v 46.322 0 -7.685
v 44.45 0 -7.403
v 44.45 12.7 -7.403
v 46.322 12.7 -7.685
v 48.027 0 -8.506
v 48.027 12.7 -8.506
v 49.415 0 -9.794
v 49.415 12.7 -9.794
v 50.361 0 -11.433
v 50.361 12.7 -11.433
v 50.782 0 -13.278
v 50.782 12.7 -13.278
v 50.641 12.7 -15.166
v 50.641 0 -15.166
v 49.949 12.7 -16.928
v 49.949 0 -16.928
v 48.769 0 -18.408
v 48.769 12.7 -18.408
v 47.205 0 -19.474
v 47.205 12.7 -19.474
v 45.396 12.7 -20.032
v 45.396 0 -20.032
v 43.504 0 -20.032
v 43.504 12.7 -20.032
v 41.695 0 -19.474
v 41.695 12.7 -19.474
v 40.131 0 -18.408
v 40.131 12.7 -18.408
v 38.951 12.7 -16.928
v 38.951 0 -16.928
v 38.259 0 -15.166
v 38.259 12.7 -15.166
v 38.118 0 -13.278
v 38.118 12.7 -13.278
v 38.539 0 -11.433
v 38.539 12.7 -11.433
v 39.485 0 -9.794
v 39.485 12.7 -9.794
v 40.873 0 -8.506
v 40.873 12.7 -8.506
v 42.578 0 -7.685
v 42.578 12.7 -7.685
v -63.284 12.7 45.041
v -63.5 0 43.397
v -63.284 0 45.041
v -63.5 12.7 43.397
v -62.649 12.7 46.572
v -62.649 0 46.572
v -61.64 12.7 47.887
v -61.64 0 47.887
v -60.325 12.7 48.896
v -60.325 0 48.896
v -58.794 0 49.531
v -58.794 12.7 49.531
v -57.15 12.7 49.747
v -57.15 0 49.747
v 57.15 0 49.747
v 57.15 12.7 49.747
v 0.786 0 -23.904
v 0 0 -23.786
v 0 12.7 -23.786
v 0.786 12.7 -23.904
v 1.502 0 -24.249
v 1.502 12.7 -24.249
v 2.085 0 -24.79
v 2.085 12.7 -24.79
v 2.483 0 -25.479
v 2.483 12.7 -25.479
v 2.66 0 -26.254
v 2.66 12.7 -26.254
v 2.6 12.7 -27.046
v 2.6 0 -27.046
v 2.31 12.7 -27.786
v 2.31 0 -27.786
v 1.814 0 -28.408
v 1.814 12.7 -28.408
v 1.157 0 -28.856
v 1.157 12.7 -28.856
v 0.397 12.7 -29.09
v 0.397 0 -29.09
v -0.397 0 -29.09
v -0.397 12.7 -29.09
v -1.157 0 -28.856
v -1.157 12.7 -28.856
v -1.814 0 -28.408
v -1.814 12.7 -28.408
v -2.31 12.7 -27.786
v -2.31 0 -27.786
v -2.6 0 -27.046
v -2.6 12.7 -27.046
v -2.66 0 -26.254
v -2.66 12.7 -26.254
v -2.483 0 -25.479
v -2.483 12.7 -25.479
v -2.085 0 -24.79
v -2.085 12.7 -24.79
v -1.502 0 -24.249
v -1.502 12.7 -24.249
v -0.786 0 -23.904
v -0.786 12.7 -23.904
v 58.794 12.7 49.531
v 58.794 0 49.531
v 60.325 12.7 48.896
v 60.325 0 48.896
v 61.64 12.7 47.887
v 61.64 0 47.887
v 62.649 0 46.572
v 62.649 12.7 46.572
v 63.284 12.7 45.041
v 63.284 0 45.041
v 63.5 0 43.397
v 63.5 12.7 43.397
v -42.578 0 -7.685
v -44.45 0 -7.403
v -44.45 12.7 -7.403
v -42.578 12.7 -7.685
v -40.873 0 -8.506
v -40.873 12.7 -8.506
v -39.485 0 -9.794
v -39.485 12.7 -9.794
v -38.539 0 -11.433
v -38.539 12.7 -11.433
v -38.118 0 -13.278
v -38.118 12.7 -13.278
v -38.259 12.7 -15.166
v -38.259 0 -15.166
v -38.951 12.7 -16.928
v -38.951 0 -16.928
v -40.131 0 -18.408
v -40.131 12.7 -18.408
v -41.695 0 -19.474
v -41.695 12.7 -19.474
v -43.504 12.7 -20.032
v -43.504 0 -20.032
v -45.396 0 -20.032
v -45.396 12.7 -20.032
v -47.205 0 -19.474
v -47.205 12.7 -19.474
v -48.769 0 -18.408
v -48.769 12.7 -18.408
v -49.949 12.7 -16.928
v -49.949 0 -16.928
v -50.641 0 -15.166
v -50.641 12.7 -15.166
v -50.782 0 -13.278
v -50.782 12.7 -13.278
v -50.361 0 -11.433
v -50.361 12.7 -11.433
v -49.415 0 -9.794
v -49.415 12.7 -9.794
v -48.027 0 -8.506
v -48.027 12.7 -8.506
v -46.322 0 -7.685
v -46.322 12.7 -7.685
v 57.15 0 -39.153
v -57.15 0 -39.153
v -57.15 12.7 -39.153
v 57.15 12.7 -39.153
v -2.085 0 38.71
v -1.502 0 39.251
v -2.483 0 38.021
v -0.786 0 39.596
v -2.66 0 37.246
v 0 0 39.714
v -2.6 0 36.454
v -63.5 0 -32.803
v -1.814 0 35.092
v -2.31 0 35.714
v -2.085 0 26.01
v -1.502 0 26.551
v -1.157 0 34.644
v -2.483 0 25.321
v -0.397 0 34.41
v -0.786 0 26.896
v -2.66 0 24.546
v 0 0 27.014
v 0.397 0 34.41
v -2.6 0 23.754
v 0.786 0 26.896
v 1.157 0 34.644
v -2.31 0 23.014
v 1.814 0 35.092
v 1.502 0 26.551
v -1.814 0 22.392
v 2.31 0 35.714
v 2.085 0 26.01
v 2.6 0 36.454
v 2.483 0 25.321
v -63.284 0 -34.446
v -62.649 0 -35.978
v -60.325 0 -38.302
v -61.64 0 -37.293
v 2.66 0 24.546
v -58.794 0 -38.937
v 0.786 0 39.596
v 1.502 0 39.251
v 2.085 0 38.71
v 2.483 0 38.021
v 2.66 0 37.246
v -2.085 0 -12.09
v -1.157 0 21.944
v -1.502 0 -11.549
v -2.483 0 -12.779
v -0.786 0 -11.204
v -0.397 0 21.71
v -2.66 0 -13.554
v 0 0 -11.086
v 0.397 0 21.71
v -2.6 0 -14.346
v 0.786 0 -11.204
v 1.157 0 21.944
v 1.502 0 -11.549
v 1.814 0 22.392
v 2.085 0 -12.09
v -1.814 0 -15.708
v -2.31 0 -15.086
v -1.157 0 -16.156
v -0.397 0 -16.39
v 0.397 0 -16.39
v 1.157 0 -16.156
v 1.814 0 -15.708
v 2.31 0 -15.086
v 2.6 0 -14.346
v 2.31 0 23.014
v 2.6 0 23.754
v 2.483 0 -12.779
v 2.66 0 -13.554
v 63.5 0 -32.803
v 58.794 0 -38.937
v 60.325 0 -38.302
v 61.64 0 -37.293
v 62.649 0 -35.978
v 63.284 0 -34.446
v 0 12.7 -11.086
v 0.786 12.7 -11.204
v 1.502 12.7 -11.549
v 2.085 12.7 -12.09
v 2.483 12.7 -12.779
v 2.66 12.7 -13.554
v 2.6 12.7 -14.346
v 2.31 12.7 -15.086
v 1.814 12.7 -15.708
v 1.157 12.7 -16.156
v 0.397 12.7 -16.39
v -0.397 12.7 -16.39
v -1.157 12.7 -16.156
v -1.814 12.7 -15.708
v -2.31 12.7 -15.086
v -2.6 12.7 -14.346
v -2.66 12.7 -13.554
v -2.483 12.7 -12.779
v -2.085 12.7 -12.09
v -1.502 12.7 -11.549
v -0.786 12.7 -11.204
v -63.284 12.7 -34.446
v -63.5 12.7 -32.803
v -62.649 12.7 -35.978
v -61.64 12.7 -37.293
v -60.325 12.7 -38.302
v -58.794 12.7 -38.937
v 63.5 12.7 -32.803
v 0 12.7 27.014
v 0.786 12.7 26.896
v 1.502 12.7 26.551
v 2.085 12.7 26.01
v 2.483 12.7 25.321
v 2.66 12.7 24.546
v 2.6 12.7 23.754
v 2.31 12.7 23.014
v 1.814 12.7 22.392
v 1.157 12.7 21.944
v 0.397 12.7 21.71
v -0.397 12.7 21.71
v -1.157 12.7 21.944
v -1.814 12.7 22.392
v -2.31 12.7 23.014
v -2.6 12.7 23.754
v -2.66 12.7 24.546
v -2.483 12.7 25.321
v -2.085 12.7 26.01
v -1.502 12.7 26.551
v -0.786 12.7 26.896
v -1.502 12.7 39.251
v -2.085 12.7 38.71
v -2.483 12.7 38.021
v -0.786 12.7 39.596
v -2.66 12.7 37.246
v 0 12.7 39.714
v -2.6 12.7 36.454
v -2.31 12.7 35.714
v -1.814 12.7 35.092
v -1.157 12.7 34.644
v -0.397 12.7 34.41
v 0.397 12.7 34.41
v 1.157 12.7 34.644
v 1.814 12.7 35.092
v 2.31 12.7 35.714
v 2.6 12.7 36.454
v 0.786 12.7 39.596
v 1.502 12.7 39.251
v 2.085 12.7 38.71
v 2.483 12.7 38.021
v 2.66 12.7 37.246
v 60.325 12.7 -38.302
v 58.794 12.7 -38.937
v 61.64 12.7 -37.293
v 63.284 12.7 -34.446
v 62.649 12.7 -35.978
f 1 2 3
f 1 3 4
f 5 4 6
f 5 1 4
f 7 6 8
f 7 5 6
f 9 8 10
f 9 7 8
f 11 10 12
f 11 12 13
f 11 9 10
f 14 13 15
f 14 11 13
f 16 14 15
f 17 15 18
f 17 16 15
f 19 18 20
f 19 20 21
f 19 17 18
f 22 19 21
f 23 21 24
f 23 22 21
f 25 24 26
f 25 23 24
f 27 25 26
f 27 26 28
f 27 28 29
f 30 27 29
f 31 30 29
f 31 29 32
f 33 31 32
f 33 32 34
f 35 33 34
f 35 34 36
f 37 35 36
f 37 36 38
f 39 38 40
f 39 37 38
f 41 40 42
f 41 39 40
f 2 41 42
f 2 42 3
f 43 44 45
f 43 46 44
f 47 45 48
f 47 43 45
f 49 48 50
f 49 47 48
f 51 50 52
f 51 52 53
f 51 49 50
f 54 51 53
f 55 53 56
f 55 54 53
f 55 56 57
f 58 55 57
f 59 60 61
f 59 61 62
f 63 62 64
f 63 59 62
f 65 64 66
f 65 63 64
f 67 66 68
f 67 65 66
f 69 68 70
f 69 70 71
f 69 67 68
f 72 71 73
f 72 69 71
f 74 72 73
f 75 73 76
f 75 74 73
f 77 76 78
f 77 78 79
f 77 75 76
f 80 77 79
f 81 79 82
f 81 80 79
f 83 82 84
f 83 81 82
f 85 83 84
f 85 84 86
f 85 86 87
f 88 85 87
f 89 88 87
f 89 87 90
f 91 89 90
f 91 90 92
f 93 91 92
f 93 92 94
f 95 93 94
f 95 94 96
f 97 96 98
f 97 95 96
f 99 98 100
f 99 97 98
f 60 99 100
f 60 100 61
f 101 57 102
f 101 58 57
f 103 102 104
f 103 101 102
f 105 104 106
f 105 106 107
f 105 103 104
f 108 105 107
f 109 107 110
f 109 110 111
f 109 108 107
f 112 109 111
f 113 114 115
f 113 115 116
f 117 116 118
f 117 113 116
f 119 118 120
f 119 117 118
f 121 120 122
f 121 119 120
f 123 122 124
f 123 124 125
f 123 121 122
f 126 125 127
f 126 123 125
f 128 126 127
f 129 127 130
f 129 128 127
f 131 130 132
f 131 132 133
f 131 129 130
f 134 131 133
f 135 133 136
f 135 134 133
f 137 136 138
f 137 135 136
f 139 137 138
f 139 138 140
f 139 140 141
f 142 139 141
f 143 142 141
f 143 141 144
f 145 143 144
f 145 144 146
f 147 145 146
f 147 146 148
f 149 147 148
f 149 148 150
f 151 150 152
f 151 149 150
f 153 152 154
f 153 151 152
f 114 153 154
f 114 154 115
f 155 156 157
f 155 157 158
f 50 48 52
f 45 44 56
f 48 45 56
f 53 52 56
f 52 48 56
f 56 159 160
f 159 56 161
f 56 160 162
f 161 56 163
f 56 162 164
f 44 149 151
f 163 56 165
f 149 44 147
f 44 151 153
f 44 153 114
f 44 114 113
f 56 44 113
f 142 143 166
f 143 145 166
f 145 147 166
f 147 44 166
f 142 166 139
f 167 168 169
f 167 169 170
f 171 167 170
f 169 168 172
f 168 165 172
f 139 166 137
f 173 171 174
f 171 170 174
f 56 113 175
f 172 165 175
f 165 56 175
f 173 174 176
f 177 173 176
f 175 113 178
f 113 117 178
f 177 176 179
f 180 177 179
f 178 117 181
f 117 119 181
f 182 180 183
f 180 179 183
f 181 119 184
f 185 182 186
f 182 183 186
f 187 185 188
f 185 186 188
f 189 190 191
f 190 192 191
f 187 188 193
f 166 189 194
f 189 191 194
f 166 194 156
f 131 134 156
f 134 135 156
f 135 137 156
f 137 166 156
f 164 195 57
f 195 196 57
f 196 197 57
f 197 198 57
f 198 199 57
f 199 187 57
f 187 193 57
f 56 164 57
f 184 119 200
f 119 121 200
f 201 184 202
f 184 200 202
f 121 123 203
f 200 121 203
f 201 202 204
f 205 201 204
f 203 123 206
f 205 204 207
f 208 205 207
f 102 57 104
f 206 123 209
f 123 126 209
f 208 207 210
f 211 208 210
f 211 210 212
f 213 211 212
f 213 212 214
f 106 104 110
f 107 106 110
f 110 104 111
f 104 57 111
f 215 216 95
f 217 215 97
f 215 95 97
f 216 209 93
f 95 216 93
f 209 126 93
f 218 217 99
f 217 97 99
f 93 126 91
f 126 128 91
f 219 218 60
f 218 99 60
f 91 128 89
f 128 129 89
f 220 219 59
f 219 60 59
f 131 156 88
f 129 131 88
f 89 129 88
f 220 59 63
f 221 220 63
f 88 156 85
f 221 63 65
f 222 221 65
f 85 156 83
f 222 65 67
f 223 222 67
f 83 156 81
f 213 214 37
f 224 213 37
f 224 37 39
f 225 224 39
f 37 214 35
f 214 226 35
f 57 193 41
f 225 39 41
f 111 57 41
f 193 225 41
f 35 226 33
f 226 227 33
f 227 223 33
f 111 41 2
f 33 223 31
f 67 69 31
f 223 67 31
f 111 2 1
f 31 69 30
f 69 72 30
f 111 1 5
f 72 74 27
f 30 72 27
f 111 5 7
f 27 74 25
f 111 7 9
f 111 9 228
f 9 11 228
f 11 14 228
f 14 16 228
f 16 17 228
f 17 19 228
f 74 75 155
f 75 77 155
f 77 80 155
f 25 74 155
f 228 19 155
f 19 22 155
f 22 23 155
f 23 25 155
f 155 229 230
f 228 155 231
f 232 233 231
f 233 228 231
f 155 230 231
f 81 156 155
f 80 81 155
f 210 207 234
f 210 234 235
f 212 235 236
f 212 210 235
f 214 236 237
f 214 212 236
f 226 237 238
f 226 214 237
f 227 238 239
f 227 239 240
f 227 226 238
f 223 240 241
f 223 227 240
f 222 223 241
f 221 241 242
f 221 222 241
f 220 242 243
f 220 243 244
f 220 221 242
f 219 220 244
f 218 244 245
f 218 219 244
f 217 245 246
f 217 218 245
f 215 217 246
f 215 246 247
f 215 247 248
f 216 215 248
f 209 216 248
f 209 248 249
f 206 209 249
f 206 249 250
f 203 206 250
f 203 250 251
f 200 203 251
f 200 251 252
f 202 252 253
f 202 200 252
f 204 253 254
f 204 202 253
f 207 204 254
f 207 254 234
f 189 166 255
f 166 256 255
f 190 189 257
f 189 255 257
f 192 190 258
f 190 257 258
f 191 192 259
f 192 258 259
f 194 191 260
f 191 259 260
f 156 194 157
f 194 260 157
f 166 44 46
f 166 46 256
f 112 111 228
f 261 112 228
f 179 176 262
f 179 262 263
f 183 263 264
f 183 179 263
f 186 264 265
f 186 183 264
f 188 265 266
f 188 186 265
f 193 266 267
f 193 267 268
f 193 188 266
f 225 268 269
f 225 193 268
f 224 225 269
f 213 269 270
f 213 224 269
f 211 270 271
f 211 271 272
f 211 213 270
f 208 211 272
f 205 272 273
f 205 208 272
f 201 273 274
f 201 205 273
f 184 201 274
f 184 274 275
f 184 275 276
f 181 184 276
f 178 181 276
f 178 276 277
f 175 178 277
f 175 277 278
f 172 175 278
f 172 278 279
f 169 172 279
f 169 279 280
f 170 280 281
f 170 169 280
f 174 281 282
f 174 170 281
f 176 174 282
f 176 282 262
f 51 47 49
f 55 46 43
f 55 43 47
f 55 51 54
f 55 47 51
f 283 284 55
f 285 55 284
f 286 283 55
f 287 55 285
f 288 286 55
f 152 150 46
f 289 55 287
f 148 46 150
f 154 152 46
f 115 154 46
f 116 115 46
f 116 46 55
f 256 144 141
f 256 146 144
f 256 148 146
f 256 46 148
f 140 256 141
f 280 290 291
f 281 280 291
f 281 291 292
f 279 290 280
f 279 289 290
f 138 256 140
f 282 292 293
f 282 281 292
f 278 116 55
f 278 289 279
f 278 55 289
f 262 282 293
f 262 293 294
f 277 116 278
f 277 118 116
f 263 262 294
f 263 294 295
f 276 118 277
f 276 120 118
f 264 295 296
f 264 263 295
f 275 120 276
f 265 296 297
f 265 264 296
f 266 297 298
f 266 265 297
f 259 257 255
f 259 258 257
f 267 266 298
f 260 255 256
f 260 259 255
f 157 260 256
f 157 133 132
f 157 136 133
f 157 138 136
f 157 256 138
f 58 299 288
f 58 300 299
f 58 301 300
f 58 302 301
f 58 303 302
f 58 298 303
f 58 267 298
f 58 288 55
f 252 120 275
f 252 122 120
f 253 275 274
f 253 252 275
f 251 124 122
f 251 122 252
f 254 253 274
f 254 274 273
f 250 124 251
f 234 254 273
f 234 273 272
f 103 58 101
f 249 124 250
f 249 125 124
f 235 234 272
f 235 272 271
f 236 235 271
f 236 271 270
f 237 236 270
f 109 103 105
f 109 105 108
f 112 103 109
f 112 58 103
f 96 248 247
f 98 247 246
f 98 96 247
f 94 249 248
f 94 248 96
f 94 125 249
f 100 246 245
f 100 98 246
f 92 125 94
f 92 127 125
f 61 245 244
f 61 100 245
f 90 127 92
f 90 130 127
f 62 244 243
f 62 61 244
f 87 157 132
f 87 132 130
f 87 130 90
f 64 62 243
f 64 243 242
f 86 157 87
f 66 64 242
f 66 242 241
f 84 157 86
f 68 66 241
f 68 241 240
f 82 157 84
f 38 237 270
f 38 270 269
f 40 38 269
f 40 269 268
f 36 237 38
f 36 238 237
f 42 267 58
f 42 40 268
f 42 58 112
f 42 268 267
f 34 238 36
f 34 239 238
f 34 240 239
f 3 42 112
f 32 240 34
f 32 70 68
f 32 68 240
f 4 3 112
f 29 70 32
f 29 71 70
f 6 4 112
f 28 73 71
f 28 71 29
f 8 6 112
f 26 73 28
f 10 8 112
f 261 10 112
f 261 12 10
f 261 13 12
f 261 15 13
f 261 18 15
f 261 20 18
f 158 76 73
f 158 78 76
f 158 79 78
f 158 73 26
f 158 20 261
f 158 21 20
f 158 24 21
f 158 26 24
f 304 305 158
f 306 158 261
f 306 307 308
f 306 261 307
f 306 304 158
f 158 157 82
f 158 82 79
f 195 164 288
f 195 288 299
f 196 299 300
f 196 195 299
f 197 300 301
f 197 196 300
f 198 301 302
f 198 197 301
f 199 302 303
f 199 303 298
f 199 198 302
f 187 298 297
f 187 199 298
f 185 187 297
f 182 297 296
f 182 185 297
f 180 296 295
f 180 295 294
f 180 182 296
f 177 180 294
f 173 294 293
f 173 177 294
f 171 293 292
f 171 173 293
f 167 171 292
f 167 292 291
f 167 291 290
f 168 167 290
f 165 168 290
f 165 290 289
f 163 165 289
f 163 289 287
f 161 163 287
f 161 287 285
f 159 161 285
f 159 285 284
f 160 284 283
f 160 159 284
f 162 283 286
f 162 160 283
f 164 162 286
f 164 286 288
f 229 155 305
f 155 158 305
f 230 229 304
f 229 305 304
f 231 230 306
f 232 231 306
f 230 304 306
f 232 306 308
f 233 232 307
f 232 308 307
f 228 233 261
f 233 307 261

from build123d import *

# Parameters (mm, degrees)
SKETCH2_W           = 127
SKETCH2_H           = 88.9
SKETCH2_R           = 6.35
SKETCH2_R_2         = 2.667
BOSS_EXTRUDE1_DEPTH = 12.7
FILLET1_R           = 6.35


with BuildPart() as part:
    # Sketch2 → Boss-Extrude1 (new body)
    with BuildSketch(Plane(origin=(0, 0, 0), x_dir=(1, 0, 0), z_dir=(0, 1, 0))):
        with Locations((0, -5.297057788)):
            Rectangle(SKETCH2_W, SKETCH2_H)
        with Locations(Location((-44.45, 13.752942212, 0), (0, 0, 270))):
            Circle(SKETCH2_R, mode=Mode.SUBTRACT)
        with Locations(Location((0, 26.452942212, 0), (0, 0, 270))):
            Circle(SKETCH2_R_2, mode=Mode.SUBTRACT)
        with Locations(Location((0, 13.752942212, 0), (0, 0, 270))):
            Circle(SKETCH2_R_2, mode=Mode.SUBTRACT)
        with Locations(Location((44.45, 13.752942212, 0), (0, 0, 270))):
            Circle(SKETCH2_R, mode=Mode.SUBTRACT)
        with Locations(Location((0, -37.047057788, 0), (0, 0, 270))):
            Circle(SKETCH2_R_2, mode=Mode.SUBTRACT)
        with Locations(Location((0, -24.347057788, 0), (0, 0, 270))):
            Circle(SKETCH2_R_2, mode=Mode.SUBTRACT)
    extrude(amount=BOSS_EXTRUDE1_DEPTH)

    # Fillet1
    fillet1_edges = [part.edges().sort_by_distance(p)[0] for p in [
        (-63.5, 6.35, 49.747057788),
        (-63.5, 6.35, -39.152942212),
        (63.5, 6.35, -39.152942212),
        (63.5, 6.35, 49.747057788),
    ]]
    fillet(fillet1_edges, radius=FILLET1_R)


solid = part.part
